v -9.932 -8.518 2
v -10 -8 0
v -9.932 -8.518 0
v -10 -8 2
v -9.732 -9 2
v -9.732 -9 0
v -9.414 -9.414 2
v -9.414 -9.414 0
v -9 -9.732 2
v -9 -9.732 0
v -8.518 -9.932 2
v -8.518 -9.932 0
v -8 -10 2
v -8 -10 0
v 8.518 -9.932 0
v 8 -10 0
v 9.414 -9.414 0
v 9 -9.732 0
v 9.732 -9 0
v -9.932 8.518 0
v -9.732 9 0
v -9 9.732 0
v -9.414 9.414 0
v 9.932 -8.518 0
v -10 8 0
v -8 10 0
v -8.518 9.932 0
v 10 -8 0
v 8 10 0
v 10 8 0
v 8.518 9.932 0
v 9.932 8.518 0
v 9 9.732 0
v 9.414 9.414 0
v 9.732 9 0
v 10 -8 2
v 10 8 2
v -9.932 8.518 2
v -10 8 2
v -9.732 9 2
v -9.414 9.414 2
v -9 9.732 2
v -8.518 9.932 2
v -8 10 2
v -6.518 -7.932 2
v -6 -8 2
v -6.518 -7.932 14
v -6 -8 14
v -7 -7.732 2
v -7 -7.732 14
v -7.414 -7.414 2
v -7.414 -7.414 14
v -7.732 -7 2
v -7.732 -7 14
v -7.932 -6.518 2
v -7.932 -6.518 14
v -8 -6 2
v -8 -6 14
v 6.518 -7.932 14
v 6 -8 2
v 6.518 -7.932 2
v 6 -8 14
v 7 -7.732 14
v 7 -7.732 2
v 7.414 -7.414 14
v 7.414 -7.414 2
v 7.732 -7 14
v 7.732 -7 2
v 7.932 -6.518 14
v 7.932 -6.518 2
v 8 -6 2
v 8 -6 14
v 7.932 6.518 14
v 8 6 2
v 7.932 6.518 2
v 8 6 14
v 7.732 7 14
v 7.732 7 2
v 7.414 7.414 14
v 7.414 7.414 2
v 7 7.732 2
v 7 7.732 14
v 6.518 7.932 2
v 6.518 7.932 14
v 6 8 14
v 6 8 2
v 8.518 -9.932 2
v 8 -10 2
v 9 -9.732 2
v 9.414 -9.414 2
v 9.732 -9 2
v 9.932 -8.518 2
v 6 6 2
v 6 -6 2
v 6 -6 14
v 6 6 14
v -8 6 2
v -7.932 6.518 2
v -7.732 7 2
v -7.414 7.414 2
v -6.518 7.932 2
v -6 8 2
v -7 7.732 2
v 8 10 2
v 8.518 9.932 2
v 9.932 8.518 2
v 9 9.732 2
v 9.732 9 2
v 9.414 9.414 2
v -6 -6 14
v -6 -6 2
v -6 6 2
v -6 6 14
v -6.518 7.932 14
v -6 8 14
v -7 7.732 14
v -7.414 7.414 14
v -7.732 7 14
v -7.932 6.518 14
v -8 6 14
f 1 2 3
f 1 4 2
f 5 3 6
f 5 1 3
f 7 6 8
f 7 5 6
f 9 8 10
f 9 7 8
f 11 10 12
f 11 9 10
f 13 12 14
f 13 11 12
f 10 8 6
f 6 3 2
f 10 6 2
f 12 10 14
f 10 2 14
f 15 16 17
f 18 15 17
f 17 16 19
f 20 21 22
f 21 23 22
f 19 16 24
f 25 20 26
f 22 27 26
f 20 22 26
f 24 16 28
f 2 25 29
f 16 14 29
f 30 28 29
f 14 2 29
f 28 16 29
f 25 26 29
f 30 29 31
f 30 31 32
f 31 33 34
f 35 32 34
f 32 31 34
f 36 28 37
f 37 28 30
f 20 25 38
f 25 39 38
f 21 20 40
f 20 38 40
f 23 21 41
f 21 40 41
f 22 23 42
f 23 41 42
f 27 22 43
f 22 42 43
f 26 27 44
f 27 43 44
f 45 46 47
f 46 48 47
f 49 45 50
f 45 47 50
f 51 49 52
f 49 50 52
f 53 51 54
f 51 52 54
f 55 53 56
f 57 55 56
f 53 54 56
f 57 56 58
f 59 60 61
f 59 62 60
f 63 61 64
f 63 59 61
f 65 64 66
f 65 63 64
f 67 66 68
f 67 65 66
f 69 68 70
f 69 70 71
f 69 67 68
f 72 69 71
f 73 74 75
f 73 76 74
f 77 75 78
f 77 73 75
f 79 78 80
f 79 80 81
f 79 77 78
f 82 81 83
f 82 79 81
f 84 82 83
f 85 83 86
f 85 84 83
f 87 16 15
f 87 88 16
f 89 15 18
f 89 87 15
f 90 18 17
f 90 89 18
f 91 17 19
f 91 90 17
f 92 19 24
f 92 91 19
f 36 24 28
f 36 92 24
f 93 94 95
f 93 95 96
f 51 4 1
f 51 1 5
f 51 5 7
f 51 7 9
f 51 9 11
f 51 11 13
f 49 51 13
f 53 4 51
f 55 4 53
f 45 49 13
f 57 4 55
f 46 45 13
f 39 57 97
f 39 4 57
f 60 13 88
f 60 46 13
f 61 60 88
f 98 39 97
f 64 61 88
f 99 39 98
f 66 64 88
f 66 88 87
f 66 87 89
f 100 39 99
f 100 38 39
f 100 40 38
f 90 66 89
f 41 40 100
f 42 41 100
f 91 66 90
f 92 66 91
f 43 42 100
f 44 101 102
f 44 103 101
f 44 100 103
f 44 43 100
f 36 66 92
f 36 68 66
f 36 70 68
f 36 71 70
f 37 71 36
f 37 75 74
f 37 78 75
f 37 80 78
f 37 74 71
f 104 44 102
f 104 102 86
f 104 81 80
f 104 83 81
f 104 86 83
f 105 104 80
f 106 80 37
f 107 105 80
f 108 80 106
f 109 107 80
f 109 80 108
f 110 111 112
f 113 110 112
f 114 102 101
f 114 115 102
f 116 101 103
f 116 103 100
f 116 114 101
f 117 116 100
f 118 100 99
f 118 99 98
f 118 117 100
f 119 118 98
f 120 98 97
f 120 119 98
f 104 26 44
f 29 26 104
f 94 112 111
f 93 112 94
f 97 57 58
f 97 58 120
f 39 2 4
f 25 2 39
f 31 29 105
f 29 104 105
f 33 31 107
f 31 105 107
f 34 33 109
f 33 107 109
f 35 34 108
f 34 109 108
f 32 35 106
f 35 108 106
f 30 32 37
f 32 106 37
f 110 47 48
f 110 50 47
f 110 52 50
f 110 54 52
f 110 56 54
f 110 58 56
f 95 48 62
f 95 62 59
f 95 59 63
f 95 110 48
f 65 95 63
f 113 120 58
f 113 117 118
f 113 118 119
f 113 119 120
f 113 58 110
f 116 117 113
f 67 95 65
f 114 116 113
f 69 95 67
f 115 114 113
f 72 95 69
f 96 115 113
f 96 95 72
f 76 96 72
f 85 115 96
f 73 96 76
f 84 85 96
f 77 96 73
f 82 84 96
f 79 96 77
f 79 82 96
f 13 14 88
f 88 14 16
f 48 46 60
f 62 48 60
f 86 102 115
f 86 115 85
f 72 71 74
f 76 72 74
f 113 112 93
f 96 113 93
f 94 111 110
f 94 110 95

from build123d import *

# Parameters (mm, degrees)
F0_W     = 20
F0_H     = 20
F1_DEPTH = 2
F2_W     = 16
F2_H     = 16
F2_W_2   = 12
F2_H_2   = 12
F3_DEPTH = 12
F4_R     = 2


with BuildPart() as f1:
    # F0 (on Top) → F1 (new body)
    with BuildSketch(Plane.XY):
        Rectangle(F0_W, F0_H)
    extrude(amount=F1_DEPTH)

    # F2 (on face) → F3 (join)
    with BuildSketch(Plane.XY.offset(2)):
        Rectangle(F2_W, F2_H)
        Rectangle(F2_W_2, F2_H_2, mode=Mode.SUBTRACT)
    extrude(amount=F3_DEPTH)

    # F4
    f4_edges = [f1.edges().sort_by_distance(p)[0] for p in [
        (-10, 10, 1),
        (-8, 8, 8),
        (-10, -10, 1),
        (-8, -8, 8),
        (10, 10, 1),
        (8, 8, 8),
        (10, -10, 1),
        (8, -8, 8),
    ]]
    fillet(f4_edges, radius=F4_R)


solid = f1.part
